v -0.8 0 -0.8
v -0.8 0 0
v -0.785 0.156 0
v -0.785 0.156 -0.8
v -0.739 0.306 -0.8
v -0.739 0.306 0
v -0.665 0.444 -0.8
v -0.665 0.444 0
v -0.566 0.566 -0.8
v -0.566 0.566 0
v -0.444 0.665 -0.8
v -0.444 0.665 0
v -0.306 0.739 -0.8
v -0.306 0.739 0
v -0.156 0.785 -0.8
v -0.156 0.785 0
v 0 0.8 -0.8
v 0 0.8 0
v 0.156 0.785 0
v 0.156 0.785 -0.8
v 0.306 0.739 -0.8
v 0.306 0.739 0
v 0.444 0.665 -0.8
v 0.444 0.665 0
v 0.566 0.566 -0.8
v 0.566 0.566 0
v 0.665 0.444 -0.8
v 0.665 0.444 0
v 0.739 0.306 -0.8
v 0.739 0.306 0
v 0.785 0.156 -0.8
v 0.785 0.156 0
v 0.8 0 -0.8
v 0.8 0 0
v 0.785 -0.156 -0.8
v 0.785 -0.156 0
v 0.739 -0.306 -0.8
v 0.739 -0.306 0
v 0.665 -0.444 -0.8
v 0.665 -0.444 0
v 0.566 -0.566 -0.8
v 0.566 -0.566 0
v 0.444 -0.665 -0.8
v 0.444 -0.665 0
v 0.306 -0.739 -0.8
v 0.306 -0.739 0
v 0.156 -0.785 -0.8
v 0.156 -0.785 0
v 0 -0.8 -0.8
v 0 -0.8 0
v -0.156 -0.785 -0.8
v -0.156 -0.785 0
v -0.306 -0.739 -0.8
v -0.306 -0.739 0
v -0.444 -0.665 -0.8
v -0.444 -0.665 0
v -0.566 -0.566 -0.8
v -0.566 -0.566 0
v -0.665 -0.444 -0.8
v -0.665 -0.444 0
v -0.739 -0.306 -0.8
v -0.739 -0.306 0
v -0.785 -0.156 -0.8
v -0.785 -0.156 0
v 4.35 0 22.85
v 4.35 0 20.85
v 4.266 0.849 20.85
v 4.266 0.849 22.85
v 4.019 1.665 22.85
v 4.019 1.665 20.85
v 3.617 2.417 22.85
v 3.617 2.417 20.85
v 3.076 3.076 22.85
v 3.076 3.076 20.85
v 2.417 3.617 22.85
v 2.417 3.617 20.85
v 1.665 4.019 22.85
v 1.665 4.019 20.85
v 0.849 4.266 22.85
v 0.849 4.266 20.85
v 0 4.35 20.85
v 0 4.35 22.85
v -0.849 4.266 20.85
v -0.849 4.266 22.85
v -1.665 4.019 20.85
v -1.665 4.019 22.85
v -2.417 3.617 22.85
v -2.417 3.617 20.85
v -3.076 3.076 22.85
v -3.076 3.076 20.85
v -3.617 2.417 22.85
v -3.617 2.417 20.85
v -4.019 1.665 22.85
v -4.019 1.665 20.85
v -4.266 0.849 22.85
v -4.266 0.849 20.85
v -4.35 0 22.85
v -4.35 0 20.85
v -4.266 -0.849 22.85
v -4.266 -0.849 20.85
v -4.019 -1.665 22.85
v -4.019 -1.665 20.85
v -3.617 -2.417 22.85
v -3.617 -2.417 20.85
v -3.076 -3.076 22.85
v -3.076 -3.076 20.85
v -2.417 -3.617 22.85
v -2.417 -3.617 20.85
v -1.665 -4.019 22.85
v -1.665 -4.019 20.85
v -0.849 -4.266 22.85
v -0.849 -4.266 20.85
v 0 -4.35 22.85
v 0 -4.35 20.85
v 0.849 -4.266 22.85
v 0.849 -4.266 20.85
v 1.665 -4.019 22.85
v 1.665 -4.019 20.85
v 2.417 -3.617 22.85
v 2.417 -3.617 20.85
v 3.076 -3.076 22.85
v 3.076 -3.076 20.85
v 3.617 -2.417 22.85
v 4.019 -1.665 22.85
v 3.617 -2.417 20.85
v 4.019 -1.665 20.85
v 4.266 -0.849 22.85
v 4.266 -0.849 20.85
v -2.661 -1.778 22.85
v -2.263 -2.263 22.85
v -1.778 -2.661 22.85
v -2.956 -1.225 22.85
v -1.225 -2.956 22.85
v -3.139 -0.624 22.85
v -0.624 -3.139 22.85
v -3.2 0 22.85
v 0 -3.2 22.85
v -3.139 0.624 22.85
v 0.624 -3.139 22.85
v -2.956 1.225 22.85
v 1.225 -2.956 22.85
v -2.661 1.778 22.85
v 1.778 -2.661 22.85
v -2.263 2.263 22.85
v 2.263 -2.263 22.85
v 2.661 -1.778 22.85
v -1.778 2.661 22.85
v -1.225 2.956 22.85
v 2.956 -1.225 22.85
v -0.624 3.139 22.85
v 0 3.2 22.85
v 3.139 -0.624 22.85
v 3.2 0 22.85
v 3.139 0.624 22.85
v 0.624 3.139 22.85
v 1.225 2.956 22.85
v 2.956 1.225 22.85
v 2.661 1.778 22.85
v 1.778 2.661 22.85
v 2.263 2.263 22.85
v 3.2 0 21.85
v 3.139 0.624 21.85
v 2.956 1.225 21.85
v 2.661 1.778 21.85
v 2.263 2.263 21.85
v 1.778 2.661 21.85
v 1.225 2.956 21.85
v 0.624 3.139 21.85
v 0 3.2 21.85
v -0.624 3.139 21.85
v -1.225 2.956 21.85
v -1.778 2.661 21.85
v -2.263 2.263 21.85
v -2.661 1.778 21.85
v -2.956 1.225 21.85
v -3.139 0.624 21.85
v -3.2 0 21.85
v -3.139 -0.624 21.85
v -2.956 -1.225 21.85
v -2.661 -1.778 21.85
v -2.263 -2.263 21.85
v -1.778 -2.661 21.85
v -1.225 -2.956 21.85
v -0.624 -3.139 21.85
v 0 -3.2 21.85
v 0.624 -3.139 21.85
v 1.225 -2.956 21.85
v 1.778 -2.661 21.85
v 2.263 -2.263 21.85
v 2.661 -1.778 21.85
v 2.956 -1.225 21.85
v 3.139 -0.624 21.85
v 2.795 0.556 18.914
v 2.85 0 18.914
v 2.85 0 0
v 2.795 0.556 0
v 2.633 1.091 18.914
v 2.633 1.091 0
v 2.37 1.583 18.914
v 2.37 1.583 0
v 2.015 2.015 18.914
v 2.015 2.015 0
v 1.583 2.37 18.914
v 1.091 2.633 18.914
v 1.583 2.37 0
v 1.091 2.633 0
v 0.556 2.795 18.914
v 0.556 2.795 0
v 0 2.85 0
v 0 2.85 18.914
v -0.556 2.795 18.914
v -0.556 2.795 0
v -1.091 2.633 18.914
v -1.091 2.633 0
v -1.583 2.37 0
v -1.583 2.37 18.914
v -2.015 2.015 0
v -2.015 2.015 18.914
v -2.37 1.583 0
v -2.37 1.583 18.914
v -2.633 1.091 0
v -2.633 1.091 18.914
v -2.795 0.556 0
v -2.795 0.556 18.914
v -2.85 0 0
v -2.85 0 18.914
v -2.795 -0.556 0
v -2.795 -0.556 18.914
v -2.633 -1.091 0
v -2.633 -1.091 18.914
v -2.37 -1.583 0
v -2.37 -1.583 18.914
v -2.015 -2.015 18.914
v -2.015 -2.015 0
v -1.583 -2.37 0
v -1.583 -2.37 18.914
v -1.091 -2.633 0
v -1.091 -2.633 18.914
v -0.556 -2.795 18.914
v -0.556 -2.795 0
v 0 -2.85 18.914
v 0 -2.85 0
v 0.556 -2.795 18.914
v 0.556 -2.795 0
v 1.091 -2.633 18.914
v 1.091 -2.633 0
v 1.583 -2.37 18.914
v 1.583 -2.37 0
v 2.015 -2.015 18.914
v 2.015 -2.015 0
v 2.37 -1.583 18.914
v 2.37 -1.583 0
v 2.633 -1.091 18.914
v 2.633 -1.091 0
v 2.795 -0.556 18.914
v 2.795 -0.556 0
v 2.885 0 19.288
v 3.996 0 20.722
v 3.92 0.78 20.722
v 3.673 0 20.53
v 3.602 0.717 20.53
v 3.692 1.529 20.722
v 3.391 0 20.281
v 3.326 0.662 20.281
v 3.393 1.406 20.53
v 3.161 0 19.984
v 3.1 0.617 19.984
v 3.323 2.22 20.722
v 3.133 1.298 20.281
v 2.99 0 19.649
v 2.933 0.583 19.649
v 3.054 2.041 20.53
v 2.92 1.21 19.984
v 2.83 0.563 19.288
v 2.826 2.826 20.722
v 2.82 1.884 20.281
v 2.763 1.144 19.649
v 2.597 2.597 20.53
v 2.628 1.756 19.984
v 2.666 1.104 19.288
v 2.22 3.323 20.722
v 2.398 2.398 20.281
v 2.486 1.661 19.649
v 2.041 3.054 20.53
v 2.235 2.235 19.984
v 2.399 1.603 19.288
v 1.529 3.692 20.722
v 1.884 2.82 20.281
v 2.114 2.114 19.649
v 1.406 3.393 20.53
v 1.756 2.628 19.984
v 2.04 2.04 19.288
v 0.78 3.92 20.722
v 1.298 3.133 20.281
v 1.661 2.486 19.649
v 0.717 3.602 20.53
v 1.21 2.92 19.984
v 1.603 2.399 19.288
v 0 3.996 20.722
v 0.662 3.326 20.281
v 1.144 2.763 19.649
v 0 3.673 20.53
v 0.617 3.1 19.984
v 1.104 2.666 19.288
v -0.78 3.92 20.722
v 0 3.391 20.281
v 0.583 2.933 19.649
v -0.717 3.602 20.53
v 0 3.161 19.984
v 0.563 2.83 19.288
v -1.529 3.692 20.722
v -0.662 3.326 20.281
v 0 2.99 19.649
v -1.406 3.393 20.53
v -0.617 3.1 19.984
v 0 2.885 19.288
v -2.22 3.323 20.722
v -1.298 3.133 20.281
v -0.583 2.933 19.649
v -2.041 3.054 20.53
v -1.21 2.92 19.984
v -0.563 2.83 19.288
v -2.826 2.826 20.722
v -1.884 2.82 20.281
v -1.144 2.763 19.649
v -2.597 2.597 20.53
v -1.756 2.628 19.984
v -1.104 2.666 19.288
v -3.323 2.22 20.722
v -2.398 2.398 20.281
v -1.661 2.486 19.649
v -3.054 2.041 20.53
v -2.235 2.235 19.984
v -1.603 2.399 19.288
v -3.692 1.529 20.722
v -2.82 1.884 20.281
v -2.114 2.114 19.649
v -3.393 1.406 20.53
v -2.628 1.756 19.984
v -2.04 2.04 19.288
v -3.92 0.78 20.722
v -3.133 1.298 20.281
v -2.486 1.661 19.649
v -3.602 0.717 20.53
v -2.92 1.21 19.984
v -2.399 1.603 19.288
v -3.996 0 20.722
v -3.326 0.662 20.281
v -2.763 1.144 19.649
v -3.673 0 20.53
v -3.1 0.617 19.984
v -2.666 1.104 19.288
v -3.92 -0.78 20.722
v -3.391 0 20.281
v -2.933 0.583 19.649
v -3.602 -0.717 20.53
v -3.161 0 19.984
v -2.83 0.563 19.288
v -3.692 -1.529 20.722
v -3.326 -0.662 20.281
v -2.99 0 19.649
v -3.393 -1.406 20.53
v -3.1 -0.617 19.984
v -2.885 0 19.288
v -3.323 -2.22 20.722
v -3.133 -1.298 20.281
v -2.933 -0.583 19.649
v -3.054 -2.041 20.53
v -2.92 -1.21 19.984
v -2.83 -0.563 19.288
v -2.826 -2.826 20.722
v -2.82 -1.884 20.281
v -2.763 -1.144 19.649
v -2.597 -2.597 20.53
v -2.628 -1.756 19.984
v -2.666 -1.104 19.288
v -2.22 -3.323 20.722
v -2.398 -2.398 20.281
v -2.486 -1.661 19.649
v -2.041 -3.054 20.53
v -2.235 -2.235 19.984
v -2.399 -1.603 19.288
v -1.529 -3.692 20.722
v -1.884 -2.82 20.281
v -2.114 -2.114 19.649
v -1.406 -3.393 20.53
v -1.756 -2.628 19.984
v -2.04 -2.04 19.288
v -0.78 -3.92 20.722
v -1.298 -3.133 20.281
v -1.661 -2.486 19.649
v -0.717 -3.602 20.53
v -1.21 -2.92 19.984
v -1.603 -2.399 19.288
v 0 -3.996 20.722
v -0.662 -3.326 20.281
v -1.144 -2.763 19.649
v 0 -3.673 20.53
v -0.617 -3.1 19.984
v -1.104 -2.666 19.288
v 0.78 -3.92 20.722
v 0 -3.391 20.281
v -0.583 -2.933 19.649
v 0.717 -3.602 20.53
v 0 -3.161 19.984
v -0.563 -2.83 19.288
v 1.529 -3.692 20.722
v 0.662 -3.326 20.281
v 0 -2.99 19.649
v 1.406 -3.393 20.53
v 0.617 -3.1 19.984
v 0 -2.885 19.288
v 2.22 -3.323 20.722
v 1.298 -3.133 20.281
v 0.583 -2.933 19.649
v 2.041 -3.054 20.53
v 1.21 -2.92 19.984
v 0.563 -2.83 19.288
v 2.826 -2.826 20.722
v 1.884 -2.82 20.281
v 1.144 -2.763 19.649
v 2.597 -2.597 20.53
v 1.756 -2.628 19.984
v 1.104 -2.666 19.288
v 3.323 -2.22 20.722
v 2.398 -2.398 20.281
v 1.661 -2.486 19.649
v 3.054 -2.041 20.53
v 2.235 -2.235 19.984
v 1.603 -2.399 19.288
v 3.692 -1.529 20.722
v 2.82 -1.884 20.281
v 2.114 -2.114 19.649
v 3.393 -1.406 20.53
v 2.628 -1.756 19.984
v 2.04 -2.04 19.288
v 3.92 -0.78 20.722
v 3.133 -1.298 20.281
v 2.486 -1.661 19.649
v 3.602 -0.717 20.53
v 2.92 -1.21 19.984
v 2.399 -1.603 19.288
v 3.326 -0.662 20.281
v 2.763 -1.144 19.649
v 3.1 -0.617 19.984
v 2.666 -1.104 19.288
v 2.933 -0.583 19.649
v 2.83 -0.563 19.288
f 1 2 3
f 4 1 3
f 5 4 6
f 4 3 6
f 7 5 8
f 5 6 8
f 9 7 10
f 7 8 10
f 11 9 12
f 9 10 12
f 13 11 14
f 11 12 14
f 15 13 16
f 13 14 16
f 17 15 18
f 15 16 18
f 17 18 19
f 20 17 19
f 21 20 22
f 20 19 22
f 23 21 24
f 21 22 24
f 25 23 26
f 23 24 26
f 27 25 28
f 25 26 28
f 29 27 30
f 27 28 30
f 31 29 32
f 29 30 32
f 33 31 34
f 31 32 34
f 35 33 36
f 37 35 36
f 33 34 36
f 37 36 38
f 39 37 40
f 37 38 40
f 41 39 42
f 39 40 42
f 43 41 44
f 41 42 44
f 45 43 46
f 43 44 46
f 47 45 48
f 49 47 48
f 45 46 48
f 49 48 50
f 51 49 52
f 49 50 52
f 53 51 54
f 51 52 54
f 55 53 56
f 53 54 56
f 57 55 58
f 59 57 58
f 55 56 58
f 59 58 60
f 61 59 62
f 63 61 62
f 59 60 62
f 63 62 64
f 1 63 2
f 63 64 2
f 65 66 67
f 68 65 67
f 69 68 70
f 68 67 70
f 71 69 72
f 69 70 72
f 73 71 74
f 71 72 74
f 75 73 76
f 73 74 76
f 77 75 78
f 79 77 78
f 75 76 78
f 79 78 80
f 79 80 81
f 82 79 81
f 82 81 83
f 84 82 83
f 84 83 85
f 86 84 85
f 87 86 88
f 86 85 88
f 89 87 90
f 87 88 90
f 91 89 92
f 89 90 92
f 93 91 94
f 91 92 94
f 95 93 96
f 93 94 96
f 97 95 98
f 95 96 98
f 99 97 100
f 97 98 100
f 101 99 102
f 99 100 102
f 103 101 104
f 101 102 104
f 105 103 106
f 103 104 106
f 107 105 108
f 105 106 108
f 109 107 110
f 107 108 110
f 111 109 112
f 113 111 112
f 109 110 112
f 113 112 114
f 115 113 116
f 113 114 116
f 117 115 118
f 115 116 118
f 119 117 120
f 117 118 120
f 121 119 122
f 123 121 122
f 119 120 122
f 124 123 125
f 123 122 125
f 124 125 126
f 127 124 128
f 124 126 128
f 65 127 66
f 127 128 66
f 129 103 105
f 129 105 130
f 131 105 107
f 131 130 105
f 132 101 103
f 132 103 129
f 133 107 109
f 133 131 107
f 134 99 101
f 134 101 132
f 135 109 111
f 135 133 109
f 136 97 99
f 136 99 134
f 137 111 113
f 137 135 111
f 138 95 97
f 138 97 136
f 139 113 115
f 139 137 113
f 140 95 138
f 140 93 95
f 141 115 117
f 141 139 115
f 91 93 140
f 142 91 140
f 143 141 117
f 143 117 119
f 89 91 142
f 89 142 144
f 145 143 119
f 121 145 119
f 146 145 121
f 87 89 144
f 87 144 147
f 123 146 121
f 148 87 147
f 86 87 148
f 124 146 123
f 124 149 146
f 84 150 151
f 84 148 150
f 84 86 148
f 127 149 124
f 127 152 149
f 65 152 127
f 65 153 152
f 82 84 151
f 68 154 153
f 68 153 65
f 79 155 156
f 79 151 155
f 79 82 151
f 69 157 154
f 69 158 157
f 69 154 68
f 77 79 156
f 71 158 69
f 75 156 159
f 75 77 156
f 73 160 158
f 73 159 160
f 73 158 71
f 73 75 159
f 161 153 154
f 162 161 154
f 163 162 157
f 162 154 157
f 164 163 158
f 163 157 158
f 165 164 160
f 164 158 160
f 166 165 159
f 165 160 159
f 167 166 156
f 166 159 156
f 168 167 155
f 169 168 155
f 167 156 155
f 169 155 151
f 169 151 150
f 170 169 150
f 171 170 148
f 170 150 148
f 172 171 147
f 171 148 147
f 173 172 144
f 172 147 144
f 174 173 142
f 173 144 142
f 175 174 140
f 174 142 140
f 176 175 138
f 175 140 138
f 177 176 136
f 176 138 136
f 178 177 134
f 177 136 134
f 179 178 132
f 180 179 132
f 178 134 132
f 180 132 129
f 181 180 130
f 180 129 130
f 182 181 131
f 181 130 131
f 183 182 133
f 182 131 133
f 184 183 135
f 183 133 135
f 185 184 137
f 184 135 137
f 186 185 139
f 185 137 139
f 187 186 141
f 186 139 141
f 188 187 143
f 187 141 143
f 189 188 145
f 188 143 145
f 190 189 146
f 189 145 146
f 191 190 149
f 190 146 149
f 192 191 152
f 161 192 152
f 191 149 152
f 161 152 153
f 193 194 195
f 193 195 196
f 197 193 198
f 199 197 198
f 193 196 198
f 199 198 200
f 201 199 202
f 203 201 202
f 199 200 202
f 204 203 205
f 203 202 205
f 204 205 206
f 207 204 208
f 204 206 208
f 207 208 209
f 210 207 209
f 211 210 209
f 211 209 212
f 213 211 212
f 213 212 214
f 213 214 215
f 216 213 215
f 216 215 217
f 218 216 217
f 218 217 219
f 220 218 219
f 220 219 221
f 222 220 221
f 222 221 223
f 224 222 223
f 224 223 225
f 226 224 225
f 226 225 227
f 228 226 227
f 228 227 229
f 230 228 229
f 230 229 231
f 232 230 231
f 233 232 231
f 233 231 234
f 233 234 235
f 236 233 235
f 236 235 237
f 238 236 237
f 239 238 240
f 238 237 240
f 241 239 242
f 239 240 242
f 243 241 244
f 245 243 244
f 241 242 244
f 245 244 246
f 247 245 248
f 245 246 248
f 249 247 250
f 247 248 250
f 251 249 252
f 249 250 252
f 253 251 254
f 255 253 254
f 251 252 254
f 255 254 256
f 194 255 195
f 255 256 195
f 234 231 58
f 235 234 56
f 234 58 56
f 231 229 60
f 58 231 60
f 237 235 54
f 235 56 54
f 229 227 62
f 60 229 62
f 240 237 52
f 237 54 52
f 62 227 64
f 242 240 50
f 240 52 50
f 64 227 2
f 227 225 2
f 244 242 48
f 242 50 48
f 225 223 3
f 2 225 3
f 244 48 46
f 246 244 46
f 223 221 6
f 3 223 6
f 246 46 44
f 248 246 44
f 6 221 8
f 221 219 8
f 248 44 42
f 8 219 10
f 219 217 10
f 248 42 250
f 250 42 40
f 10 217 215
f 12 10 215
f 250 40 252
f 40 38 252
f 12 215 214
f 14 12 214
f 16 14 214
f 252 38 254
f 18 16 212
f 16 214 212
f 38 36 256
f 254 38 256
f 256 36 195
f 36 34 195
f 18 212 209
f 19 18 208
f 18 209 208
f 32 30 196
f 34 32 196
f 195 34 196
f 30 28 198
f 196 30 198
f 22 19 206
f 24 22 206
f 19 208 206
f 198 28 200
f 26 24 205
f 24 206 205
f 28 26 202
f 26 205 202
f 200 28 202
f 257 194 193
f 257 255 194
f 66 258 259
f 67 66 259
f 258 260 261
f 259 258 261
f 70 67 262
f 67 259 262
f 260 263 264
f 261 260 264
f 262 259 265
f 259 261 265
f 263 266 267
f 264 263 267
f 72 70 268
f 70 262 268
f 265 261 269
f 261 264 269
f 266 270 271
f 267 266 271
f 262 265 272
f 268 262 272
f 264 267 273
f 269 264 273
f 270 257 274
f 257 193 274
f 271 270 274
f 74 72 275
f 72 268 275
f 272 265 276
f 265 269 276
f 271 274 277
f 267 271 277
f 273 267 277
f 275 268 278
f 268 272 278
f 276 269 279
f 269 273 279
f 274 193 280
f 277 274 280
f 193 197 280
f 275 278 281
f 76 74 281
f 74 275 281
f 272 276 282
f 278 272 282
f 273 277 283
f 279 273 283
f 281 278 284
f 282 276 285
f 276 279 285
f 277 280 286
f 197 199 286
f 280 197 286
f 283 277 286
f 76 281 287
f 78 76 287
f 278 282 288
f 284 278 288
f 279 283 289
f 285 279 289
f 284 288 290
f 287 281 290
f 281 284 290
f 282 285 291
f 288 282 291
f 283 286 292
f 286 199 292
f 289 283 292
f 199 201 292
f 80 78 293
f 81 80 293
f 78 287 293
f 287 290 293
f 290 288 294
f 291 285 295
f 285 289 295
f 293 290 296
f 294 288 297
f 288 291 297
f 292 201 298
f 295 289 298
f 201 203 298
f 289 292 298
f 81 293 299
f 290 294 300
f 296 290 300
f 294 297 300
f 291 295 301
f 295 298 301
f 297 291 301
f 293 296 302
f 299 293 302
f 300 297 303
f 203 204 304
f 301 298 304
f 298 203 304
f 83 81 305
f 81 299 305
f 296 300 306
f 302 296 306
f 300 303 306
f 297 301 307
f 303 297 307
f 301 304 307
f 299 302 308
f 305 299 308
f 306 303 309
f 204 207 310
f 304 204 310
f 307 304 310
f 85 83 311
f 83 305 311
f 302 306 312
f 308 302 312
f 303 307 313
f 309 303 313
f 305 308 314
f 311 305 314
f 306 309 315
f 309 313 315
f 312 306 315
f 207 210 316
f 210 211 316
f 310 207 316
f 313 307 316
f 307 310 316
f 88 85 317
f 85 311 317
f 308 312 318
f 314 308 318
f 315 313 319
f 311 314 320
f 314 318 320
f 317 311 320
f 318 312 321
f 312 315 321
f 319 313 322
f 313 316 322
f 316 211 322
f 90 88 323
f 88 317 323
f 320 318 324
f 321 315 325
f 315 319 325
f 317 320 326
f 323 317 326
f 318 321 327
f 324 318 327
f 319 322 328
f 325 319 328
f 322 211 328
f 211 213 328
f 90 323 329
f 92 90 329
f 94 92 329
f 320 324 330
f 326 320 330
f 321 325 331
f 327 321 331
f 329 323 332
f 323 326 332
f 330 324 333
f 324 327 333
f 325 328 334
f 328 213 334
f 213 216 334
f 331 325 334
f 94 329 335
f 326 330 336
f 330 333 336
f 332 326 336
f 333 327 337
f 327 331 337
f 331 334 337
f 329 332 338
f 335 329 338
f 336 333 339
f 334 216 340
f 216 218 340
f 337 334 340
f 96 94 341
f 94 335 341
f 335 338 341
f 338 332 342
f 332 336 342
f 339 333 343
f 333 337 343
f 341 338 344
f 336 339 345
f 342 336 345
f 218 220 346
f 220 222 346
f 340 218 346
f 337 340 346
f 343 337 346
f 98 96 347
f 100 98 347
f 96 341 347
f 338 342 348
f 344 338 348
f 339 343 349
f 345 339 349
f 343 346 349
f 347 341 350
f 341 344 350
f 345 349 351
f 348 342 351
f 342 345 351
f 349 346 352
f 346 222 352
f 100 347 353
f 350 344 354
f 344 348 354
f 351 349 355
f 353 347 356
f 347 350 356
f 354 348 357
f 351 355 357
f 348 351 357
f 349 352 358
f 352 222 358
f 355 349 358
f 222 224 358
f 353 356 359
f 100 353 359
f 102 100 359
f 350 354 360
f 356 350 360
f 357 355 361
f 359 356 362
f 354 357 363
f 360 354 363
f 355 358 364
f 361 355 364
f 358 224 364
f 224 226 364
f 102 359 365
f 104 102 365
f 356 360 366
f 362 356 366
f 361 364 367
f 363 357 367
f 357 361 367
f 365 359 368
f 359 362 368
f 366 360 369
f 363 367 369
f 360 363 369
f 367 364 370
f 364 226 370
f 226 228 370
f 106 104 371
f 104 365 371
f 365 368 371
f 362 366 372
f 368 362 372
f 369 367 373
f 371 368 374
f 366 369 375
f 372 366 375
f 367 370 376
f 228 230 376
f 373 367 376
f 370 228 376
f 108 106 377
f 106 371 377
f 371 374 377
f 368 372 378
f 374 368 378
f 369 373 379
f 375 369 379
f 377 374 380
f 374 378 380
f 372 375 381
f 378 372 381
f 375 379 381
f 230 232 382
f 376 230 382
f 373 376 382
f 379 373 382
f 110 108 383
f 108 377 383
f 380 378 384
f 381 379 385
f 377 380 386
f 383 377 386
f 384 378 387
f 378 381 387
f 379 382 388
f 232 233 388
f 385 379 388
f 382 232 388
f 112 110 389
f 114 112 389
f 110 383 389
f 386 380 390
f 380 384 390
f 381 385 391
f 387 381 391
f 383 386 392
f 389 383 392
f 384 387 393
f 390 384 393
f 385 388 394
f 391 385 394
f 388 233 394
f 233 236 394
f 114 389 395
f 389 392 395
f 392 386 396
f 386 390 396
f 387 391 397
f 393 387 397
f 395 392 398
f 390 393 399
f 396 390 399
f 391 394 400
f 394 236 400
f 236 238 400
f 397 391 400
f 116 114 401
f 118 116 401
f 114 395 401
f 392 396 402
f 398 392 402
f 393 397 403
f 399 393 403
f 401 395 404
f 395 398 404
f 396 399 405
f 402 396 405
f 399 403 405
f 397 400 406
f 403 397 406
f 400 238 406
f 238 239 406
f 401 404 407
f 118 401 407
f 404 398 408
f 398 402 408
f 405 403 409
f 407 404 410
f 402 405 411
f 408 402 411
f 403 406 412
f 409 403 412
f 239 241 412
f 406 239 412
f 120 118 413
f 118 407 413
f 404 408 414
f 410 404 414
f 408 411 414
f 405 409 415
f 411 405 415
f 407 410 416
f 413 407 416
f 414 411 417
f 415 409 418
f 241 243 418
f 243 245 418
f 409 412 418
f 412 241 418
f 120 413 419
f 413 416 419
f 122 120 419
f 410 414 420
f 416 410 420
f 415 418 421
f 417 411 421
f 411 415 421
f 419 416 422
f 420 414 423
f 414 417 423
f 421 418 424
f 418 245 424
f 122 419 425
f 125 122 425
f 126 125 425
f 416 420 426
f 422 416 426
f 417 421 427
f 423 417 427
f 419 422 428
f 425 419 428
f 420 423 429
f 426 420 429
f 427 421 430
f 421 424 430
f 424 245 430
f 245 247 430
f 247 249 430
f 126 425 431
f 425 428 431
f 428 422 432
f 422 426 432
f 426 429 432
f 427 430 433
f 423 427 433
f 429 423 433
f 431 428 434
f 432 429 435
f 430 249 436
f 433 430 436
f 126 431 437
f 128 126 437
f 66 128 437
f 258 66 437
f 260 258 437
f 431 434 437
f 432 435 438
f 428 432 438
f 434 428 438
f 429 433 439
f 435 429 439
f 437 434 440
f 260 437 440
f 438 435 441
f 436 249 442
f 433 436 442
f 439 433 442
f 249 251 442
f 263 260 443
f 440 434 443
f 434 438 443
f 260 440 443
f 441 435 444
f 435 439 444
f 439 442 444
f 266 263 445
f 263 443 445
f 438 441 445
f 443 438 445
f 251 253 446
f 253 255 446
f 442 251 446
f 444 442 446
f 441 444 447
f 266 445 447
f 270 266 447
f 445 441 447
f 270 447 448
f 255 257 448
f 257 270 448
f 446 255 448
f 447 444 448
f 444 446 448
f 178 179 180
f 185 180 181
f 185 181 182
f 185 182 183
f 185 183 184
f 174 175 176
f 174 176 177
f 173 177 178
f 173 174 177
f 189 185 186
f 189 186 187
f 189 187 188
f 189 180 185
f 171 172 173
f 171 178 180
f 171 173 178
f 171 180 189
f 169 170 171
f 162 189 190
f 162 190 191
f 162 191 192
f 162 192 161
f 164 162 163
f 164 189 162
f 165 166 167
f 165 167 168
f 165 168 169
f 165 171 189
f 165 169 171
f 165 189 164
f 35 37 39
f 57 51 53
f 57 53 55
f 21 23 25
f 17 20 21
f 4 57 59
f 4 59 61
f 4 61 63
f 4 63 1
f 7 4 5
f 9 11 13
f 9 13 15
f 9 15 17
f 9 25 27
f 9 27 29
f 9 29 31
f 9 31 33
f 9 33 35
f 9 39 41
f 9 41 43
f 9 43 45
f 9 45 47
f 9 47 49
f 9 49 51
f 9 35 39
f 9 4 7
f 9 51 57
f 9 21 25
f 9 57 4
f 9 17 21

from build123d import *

# Parameters (mm, degrees)
ESQUISSE1_R             = 2.85
SHAPE_DEPTH             = 20.85
ESQUISSE2_R             = 4.35
BOSS_EXTRU_2_DEPTH      = 2
ESQUISSE3_R             = 3.2
ENL_V_MAT_EXTRU_1_DEPTH = 1
CONG_1_R                = 2
ESQUISSE4_R             = 0.8
ALIGNBEAM_DEPTH         = 0.8


with BuildPart() as part:
    # Esquisse1 → Shape (new body)
    with BuildSketch(Plane.XY):
        Circle(ESQUISSE1_R)
    extrude(amount=SHAPE_DEPTH)

    # Esquisse2 → Boss.-Extru.2 (add)
    with BuildSketch(Plane.XY.offset(20.85)):
        Circle(ESQUISSE2_R)
    extrude(amount=BOSS_EXTRU_2_DEPTH)

    # Esquisse3 → Enlèv. mat.-Extru.1 (cut)
    with BuildSketch(Plane.XY.offset(22.85)):
        Circle(ESQUISSE3_R)
    extrude(amount=-ENL_V_MAT_EXTRU_1_DEPTH, mode=Mode.SUBTRACT)

    # Congé1
    # the kernel refuses this fillet: 2 mm, written as the material it adds along each edge
    with BuildSketch(Plane(origin=(0, 0, 20.85), x_dir=(1, 0, 0), z_dir=(0, -1, 0))) as cong_1_piece_1:
        with BuildLine():
            CenterArc((4.85, -1.936491673), CONG_1_R, 104.477512186, 75.522487814)
            Line((2.85, -1.936491673), (2.81, -1.936491673))
            Line((2.81, -1.936491673), (2.81, 0))
            Line((2.81, 0), (2.85, 0.04))
            ThreePointArc((2.85, 0.04), (3.6, 0.04), (4.34, 0.038729833))
            Line((4.34, 0.038729833), (4.35, 0))
        make_face()
    revolve(axis=Axis((0, 0, 20.85), (0, 0, 1)))

    # Esquisse4 → AlignBeam (add)
    with BuildSketch(Plane(origin=(0, 0, 0), x_dir=(-1, 0, 0), z_dir=(0, 0, -1))):
        Circle(ESQUISSE4_R)
    extrude(amount=ALIGNBEAM_DEPTH)


solid = part.part
